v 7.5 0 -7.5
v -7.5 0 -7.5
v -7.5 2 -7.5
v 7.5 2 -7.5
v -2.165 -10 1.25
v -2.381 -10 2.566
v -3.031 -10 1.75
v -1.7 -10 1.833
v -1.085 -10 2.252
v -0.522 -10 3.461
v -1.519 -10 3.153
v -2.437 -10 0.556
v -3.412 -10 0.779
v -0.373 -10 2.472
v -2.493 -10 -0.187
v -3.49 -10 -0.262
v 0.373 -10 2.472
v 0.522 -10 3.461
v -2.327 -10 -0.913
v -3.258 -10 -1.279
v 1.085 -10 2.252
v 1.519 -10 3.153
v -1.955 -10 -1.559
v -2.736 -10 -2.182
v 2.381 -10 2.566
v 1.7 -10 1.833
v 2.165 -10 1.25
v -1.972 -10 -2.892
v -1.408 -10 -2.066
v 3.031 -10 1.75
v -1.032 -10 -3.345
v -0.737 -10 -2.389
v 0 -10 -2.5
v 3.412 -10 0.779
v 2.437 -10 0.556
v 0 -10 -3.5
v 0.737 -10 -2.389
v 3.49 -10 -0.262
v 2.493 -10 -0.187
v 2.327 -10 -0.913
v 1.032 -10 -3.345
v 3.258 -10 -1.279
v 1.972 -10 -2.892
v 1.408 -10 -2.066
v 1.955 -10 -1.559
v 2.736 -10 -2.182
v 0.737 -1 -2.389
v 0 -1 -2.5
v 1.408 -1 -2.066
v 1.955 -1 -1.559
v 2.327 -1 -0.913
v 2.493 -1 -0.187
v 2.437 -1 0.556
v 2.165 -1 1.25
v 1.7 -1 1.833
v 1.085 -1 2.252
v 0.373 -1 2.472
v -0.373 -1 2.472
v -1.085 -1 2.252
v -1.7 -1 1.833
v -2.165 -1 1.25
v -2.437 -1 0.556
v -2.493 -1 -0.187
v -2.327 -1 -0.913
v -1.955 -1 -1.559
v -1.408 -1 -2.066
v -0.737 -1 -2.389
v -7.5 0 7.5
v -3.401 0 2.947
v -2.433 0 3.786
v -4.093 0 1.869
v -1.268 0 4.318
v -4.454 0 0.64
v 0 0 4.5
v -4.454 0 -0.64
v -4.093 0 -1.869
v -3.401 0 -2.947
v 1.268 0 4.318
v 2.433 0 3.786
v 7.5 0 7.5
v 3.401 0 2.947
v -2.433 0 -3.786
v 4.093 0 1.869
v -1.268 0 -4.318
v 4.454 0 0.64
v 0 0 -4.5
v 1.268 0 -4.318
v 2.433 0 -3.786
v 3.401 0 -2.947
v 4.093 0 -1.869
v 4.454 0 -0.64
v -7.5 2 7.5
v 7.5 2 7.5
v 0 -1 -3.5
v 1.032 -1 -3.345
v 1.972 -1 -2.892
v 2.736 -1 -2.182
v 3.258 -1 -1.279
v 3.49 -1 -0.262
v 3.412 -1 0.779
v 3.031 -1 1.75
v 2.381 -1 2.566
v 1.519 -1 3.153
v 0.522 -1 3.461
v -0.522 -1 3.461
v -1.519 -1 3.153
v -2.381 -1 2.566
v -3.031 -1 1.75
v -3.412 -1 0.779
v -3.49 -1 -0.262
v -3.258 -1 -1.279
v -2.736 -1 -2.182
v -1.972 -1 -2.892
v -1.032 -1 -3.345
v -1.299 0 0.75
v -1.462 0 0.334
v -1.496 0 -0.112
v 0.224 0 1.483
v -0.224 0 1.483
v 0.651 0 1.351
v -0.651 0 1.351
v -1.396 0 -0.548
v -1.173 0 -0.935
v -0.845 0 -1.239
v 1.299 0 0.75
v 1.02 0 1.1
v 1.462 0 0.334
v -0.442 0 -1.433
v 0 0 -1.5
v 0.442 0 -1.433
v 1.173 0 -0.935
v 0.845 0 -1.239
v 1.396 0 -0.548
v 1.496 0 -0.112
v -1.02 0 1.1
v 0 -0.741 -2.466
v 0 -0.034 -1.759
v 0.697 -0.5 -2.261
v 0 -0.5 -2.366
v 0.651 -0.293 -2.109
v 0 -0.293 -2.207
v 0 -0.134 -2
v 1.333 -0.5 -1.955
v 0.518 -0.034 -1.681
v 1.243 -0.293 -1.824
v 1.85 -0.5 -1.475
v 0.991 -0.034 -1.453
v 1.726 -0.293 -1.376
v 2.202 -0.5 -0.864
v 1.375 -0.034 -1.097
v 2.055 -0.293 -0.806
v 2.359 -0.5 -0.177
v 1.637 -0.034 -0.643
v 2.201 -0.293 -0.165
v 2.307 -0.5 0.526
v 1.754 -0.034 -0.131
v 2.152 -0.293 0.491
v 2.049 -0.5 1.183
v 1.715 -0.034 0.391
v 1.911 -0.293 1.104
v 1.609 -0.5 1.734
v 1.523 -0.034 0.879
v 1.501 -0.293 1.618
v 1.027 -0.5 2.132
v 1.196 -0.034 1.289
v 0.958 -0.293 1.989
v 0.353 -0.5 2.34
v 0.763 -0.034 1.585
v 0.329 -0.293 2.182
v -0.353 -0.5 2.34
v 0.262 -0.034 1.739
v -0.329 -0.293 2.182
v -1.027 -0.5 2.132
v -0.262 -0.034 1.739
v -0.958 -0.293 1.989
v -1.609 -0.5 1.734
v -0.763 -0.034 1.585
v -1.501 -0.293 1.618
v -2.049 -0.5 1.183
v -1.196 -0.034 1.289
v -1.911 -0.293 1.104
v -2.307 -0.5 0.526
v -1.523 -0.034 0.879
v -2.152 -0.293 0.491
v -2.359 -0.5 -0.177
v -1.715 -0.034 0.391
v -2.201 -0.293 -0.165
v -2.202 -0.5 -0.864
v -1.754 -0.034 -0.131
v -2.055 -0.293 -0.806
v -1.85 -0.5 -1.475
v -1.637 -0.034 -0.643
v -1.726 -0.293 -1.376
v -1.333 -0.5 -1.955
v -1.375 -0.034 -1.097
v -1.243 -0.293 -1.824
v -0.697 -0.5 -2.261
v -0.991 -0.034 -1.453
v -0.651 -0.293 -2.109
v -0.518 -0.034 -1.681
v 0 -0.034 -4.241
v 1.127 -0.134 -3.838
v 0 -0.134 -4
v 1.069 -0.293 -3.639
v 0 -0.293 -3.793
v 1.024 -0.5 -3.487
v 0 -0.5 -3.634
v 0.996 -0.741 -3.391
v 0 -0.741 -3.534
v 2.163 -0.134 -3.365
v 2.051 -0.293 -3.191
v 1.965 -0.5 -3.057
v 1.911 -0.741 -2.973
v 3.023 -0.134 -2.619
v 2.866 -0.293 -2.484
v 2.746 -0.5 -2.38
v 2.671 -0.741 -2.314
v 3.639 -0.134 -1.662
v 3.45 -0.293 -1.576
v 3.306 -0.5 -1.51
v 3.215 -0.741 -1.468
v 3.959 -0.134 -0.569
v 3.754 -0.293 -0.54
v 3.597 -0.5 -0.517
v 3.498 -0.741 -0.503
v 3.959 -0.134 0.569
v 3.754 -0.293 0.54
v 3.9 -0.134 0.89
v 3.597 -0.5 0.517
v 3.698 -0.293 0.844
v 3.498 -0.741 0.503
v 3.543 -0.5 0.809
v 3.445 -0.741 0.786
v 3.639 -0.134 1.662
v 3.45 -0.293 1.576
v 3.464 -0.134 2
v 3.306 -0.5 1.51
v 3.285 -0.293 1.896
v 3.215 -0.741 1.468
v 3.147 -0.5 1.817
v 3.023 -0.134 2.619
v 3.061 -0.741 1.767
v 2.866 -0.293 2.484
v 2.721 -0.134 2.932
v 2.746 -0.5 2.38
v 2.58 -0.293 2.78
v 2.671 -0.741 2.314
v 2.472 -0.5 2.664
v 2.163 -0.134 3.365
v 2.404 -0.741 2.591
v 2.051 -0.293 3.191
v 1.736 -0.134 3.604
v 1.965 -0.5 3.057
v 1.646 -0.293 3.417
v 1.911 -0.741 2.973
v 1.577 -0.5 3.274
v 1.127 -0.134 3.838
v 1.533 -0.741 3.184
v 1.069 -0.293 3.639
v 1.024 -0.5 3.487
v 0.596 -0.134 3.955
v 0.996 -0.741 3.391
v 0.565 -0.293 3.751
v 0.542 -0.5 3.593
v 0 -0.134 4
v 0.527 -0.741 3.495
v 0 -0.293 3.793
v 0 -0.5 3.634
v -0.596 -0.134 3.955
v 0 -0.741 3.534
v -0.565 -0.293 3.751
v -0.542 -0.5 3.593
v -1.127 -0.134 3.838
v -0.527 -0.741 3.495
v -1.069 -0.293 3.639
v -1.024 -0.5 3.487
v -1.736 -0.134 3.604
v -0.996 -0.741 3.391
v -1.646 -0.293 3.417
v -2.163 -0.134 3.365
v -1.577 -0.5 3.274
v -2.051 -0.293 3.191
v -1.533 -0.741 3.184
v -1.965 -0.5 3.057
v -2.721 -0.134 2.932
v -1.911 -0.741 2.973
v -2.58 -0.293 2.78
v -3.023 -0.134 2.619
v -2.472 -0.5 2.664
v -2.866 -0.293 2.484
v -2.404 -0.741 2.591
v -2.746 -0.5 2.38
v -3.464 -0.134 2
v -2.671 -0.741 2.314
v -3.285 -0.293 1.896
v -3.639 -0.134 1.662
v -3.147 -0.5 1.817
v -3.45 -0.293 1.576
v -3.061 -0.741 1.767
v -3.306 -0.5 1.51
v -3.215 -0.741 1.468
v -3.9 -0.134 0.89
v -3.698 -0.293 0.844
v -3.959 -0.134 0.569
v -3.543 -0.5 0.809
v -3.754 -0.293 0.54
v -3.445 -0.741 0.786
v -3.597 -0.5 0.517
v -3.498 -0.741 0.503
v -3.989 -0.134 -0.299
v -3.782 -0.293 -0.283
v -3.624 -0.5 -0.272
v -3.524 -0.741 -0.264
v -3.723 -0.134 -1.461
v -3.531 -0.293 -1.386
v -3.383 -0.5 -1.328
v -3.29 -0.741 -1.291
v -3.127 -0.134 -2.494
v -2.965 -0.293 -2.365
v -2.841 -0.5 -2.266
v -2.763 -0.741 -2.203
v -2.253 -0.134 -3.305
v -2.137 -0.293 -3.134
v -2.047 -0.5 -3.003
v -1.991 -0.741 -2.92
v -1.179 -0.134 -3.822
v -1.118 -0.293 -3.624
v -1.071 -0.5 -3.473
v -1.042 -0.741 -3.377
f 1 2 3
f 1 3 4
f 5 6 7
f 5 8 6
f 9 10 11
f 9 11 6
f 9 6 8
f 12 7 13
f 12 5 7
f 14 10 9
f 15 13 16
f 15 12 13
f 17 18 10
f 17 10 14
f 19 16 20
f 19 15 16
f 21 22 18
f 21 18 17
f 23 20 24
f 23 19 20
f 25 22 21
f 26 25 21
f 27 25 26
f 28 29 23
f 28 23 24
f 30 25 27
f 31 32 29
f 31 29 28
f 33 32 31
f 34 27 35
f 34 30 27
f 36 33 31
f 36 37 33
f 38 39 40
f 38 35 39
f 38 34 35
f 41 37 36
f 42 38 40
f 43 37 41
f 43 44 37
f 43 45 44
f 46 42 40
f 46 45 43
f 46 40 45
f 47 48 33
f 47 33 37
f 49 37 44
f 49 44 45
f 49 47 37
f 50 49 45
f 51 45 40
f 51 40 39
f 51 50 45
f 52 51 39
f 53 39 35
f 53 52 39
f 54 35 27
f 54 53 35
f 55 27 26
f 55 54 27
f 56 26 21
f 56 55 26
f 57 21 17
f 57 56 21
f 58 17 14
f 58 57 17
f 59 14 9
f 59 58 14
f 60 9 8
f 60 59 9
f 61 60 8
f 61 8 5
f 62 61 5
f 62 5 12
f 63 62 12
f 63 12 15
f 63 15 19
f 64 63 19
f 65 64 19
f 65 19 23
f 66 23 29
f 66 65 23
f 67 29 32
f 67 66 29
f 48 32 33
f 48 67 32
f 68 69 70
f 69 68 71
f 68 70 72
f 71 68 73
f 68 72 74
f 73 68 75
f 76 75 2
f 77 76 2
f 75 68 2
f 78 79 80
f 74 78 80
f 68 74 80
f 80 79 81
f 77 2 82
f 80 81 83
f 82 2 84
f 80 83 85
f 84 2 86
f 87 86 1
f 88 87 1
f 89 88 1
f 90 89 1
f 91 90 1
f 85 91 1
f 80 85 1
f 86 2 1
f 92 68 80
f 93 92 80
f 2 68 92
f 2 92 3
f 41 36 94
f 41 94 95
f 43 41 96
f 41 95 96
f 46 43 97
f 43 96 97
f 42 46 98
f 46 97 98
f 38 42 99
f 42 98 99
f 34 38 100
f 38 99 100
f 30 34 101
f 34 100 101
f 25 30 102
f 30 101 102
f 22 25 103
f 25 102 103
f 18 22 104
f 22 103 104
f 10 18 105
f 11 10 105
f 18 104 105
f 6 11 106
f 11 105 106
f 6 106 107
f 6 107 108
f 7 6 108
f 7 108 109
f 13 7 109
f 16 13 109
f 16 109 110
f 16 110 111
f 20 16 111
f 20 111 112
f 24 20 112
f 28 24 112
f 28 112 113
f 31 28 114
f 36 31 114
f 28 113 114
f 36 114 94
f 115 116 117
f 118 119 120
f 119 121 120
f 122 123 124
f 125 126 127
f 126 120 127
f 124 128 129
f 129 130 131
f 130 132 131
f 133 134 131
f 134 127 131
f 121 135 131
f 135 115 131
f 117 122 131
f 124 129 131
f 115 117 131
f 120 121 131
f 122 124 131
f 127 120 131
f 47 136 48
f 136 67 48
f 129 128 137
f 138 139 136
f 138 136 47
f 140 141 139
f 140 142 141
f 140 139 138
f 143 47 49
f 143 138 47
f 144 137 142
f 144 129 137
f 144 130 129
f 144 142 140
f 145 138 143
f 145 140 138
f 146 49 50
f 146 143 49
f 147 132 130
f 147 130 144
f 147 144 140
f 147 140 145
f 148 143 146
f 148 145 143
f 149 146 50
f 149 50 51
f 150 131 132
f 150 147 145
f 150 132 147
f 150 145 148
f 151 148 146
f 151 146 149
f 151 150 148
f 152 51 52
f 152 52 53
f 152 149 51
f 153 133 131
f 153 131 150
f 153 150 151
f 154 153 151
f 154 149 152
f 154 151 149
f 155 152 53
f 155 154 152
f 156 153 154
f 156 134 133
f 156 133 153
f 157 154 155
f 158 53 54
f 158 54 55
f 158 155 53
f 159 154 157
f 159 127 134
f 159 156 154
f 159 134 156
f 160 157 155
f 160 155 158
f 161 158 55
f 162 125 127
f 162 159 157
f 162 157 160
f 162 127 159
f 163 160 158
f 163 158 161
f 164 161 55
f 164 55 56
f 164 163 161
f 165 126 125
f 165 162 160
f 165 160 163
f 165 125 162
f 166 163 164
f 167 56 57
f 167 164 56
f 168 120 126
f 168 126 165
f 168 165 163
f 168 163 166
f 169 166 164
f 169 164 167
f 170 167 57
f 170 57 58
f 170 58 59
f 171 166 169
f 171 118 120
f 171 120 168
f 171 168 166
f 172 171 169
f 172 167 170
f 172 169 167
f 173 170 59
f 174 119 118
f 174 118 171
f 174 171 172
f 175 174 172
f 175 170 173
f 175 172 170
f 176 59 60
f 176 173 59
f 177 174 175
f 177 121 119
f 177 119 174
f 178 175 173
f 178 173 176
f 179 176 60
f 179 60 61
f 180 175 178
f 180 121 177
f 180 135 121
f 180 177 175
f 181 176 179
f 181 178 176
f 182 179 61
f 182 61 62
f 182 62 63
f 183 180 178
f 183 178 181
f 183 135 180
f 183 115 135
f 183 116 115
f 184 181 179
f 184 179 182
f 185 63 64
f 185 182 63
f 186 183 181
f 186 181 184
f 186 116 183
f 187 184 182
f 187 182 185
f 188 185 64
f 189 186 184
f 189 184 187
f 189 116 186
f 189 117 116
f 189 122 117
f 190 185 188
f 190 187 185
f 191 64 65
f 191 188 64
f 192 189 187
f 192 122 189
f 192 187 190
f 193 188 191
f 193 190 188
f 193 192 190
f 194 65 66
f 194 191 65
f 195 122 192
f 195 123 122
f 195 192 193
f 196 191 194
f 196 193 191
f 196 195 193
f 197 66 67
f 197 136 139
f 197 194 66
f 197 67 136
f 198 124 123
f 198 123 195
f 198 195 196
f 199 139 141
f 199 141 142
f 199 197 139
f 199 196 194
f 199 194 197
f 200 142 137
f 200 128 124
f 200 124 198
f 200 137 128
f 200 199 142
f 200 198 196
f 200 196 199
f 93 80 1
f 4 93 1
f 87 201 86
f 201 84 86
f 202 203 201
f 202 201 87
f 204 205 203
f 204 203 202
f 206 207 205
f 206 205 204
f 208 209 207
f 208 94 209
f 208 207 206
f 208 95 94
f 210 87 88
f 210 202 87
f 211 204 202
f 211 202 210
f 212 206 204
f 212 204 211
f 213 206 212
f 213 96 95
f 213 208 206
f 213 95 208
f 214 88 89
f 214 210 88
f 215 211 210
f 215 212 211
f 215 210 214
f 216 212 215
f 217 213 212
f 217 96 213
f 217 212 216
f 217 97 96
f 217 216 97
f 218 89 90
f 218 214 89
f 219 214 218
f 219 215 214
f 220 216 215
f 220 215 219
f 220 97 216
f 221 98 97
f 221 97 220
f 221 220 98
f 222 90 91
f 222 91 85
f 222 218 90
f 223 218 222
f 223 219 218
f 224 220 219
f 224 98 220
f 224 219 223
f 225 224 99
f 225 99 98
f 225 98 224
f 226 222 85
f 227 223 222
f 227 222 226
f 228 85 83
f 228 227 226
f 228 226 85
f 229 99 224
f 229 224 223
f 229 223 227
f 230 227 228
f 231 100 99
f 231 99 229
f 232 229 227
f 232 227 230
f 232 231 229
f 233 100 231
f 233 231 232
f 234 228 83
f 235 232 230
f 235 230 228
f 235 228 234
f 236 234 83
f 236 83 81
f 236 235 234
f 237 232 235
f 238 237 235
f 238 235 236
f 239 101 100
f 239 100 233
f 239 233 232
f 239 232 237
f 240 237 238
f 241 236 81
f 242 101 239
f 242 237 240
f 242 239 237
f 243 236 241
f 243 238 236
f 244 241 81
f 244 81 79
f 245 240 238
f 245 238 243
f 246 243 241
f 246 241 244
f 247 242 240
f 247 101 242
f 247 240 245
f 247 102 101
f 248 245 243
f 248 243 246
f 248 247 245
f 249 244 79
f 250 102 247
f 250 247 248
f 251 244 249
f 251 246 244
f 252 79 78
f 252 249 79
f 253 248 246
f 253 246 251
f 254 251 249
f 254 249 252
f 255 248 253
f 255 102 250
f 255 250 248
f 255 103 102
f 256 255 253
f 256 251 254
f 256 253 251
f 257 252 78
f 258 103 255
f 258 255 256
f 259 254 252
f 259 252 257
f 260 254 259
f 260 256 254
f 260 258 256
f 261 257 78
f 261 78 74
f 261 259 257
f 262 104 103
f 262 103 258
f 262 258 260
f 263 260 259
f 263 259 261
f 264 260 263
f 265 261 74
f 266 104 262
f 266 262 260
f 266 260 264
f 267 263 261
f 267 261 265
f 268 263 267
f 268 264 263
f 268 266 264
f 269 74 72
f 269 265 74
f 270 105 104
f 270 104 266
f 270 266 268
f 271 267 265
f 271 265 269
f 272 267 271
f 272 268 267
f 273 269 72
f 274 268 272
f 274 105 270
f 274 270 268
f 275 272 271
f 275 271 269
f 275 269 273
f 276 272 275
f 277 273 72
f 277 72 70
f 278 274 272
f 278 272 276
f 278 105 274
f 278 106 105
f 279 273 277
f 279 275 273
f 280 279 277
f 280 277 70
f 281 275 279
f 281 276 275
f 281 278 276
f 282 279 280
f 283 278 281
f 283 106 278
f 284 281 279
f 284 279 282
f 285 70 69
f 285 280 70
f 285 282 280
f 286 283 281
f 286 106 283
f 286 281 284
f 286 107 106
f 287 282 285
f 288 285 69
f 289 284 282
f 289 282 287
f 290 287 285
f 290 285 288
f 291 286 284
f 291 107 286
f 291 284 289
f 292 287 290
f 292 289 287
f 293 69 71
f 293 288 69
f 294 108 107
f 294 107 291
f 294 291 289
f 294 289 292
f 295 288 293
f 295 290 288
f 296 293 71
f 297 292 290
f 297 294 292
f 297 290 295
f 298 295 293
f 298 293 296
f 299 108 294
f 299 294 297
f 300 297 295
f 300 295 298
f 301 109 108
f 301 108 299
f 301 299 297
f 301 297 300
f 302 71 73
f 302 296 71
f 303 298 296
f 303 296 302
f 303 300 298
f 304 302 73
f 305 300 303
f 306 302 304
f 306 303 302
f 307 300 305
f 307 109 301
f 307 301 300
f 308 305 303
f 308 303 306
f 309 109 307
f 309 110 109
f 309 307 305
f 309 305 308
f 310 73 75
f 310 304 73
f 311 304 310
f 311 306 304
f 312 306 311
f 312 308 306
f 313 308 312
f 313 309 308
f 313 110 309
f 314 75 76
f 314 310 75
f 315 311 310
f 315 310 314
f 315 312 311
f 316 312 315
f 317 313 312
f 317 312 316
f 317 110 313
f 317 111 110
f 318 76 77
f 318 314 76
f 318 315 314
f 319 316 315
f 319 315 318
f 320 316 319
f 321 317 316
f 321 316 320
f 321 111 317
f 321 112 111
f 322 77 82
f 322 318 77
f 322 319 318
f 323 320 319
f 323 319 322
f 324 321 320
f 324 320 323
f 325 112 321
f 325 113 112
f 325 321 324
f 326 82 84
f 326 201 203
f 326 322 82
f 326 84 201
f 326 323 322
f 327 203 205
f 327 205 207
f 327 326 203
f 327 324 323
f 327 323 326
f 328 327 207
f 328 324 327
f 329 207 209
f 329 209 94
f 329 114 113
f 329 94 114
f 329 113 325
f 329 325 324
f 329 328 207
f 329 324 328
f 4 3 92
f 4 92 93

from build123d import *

# Parameters (mm, degrees)
SKETCH2_W           = 15
SKETCH2_H           = 15
BOSS_EXTRUDE1_DEPTH = 2
SKETCH3_R           = 3.5
SKETCH3_R_2         = 2.5
BOSS_EXTRUDE2_DEPTH = 10
FILLET1_R           = 1
FILLET2_R           = 1


with BuildPart() as part:
    # Sketch2 → Boss-Extrude1 (new body)
    with BuildSketch(Plane(origin=(0, 0, 0), x_dir=(1, 0, 0), z_dir=(0, 1, 0))):
        Rectangle(SKETCH2_W, SKETCH2_H)
    extrude(amount=BOSS_EXTRUDE1_DEPTH)

    # Sketch3 → Boss-Extrude2 (add)
    with BuildSketch(Plane.XZ):
        with Locations(Location((0, 0, 0), (0, 0, 270))):
            Circle(SKETCH3_R)
        with Locations(Location((0, 0, 0), (0, 0, 270))):
            Circle(SKETCH3_R_2, mode=Mode.SUBTRACT)
    extrude(amount=BOSS_EXTRUDE2_DEPTH)

    # Fillet1
    fillet1_edges = [part.edges().sort_by_distance(p)[0] for p in [
        (0, 0, 3.5),
    ]]
    fillet(fillet1_edges, radius=FILLET1_R)

    # Fillet2
    fillet2_edges = [part.edges().sort_by_distance(p)[0] for p in [
        (0, 0, 2.5),
    ]]
    fillet(fillet2_edges, radius=FILLET2_R)


solid = part.part
